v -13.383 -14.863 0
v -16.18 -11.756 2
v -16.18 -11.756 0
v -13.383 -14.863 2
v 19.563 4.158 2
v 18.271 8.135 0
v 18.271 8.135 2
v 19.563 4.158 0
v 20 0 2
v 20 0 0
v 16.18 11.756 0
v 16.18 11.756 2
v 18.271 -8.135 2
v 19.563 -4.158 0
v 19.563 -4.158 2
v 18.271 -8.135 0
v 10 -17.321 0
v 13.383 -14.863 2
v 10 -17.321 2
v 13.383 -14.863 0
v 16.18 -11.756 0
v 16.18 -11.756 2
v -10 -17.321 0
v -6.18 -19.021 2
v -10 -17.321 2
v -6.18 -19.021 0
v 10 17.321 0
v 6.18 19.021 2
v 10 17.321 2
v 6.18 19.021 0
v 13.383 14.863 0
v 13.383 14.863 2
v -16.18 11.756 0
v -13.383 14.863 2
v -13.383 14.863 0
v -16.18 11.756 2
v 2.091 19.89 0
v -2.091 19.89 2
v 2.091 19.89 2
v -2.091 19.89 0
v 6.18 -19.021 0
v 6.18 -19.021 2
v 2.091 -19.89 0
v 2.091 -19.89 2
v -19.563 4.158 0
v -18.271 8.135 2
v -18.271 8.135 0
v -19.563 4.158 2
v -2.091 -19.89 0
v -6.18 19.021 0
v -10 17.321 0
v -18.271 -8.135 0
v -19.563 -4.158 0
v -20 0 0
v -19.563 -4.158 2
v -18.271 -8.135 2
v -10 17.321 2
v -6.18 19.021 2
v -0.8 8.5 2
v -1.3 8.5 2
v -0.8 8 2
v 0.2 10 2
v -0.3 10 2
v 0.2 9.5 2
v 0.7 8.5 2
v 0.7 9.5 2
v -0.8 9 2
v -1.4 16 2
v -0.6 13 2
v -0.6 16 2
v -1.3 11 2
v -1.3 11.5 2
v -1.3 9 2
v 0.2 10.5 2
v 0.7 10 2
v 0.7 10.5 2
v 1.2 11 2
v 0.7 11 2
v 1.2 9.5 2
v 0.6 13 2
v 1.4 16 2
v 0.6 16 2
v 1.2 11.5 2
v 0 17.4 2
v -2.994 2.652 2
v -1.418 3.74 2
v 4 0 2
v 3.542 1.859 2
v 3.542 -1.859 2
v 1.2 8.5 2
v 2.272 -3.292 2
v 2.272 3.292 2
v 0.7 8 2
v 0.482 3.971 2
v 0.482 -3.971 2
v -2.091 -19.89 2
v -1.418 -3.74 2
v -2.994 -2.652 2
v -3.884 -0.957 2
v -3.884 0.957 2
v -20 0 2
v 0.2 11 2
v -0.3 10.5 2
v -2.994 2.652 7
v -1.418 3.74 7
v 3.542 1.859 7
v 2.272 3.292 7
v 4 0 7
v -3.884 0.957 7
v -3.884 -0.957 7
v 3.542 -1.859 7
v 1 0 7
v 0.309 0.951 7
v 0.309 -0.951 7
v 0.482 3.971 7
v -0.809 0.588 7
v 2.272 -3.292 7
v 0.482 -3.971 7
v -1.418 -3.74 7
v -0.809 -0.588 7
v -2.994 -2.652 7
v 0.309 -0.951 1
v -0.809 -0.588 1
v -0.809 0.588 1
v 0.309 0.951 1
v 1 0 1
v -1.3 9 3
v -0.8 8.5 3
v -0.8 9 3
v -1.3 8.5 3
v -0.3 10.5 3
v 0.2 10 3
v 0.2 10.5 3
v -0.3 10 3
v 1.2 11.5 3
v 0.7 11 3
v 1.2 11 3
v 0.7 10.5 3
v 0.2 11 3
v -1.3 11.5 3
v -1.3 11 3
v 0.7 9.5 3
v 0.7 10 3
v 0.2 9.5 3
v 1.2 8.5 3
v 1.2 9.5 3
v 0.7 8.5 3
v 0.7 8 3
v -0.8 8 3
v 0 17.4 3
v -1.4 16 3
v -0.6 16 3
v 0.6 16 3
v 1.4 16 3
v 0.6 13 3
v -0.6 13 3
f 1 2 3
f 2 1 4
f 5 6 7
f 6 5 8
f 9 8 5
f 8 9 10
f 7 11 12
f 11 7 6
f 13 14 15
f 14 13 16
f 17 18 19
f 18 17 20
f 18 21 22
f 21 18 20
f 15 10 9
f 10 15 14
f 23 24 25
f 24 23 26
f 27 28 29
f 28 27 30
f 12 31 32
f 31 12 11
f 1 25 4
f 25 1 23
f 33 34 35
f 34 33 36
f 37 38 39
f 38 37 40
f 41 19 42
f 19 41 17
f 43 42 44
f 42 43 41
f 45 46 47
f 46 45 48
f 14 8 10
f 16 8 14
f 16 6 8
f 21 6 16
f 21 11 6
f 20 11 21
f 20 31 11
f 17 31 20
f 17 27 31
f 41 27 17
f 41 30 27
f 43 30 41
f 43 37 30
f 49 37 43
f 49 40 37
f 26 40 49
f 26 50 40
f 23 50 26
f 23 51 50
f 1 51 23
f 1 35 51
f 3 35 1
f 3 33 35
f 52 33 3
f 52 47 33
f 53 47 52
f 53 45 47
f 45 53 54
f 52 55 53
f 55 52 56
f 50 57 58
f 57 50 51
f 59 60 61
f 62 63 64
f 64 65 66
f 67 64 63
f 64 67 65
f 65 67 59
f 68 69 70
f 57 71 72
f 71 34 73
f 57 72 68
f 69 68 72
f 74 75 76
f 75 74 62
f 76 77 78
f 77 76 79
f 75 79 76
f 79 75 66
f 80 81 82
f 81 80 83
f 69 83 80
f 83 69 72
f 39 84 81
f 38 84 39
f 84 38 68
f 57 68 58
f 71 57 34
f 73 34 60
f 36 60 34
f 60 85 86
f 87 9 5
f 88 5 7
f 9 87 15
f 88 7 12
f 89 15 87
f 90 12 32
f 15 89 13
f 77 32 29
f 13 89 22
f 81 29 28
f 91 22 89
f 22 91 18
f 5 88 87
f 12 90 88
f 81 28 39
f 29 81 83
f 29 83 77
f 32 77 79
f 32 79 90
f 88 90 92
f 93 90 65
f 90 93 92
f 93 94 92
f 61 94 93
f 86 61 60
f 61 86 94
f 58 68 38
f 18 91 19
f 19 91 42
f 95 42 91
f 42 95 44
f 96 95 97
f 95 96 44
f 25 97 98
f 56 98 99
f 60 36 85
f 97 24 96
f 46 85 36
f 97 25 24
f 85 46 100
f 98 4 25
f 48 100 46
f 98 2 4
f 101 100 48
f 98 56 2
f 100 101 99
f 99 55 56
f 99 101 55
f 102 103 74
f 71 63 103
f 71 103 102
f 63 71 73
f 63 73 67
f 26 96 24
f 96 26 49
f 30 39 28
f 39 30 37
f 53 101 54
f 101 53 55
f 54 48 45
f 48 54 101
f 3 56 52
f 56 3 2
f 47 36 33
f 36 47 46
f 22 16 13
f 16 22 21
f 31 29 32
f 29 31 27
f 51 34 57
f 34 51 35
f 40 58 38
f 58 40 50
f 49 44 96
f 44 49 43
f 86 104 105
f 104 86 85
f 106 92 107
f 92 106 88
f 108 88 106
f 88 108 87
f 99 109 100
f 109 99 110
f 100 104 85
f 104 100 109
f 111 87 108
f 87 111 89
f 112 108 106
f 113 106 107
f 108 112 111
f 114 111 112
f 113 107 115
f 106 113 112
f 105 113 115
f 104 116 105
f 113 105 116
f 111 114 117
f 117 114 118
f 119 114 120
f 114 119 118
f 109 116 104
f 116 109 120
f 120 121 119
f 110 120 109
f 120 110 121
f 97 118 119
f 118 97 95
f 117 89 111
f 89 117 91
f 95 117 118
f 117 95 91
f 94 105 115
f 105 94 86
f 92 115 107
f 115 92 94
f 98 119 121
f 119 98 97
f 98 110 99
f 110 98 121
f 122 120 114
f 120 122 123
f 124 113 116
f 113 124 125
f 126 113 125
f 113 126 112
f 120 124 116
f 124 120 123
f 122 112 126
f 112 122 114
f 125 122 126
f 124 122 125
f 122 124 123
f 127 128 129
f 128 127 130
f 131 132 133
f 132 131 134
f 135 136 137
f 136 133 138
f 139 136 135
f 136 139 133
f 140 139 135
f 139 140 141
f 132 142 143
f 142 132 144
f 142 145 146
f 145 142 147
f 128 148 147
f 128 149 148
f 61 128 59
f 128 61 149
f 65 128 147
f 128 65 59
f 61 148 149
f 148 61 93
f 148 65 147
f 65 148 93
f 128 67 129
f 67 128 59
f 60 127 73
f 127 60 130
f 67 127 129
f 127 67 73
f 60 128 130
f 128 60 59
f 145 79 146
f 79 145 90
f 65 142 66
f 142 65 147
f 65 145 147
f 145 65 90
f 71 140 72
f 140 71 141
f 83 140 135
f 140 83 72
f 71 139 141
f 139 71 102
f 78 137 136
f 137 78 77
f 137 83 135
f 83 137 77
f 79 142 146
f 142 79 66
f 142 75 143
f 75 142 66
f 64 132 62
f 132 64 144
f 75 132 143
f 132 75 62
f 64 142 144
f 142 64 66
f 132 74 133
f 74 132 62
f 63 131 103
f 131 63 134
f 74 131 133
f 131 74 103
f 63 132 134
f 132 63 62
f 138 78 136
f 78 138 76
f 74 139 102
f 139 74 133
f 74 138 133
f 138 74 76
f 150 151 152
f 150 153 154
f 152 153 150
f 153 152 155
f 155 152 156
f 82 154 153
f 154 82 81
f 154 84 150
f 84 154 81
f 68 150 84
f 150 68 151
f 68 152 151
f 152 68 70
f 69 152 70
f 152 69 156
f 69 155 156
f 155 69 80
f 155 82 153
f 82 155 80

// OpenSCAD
extRad = 20; // in mm
outerPostRad = 4;
innerPostRad = 1;

bottomDial();
straightArrow();
translate([-1.3,8,0]) scale([0.5,0.5,3]) drawtext("3");

// translate([0,0,12]) topDial();

// translate([0,0,20]) rotate([180,0,0]) pin();


/******** DIAL MODULES ********/

module bottomDial() {
	difference() {
		union() {
			cylinder(r=extRad,h=2);
			cylinder(r=outerPostRad, h=7);
		}
		translate([0,0,1]) cylinder(r=innerPostRad, h=7);
	}
}

module topDial() {
	difference() {
		union() {
			cylinder(r=extRad,h=3);
		}
		union() {
			cylinder(r=outerPostRad, h=7);
			cylinder(r=extRad - 2, h=1.5);
		}
	}
}

module pin() {
	cylinder(r=outerPostRad, h=1);
	cylinder(r=innerPostRad, h=5);
}

/******** ARROW MODULES ********/

straightPoints = [[-0.6,0], [-0.6,3], [-1.4,3], [0,4.4],
		  [1.4,3], [0.6,3], [0.6,0]];
straightPath = [[0,1,2,3,4,5,6,0]];

module straightArrow() {
	translate([0,13,0]) linear_extrude(height=3) {
		polygon(points=straightPoints, paths = straightPath);
	}
}

/******** TEXT MODULES ********/


module drawtext(text) {
	//Characters
	chars = " !\"#$%&'()*+,-./0123456789:;<=>?@ABCDEFGHIJKLMNOPQRSTUVWXYZ[\\]^_`abcdefghijklmnopqrstuvwxyz{|}";

	//Chracter table defining 5x7 characters
	//Adapted from: http://www.geocities.com/dinceraydin/djlcdsim/chartable.js
	char_table = [ [ 0, 0, 0, 0, 0, 0, 0],
                  [ 4, 0, 4, 4, 4, 4, 4],
                  [ 0, 0, 0, 0,10,10,10],
                  [10,10,31,10,31,10,10],
                  [ 4,30, 5,14,20,15, 4],
                  [ 3,19, 8, 4, 2,25,24],
                  [13,18,21, 8,20,18,12],
                  [ 0, 0, 0, 0, 8, 4,12],
                  [ 2, 4, 8, 8, 8, 4, 2],
                  [ 8, 4, 2, 2, 2, 4, 8],
                  [ 0, 4,21,14,21, 4, 0],
                  [ 0, 4, 4,31, 4, 4, 0],
                  [ 8, 4,12, 0, 0, 0, 0],
                  [ 0, 0, 0,31, 0, 0, 0],
                  [12,12, 0, 0, 0, 0, 0],
                  [ 0,16, 8, 4, 2, 1, 0],
                  [14,17,25,21,19,17,14],
                  [14, 4, 4, 4, 4,12, 4],
                  [31, 8, 4, 2, 1,17,14],
                  [14,17, 1, 2, 4, 2,31],
                  [ 2, 2,31,18,10, 6, 2],
                  [14,17, 1, 1,30,16,31],
                  [14,17,17,30,16, 8, 6],
                  [ 8, 8, 8, 4, 2, 1,31],
                  [14,17,17,14,17,17,14],
                  [12, 2, 1,15,17,17,14],
                  [ 0,12,12, 0,12,12, 0],
                  [ 8, 4,12, 0,12,12, 0],
                  [ 2, 4, 8,16, 8, 4, 2],
                  [ 0, 0,31, 0,31, 0, 0],
                  [16, 8, 4, 2, 4, 8,16],
                  [ 4, 0, 4, 2, 1,17,14],
                  [14,21,21,13, 1,17,14],
                  [17,17,31,17,17,17,14],
                  [30,17,17,30,17,17,30],
                  [14,17,16,16,16,17,14],
                  [30,17,17,17,17,17,30],
                  [31,16,16,30,16,16,31],
                  [16,16,16,30,16,16,31],
                  [15,17,17,23,16,17,14],
                  [17,17,17,31,17,17,17],
                  [14, 4, 4, 4, 4, 4,14],
                  [12,18, 2, 2, 2, 2, 7],
                  [17,18,20,24,20,18,17],
                  [31,16,16,16,16,16,16],
                  [17,17,17,21,21,27,17],
                  [17,17,19,21,25,17,17],
                  [14,17,17,17,17,17,14],
                  [16,16,16,30,17,17,30],
                  [13,18,21,17,17,17,14],
                  [17,18,20,30,17,17,30],
                  [30, 1, 1,14,16,16,15],
                  [ 4, 4, 4, 4, 4, 4,31],
                  [14,17,17,17,17,17,17],
                  [ 4,10,17,17,17,17,17],
                  [10,21,21,21,17,17,17],
                  [17,17,10, 4,10,17,17],
                  [ 4, 4, 4,10,17,17,17],
                  [31,16, 8, 4, 2, 1,31],
                  [14, 8, 8, 8, 8, 8,14],
                  [ 0, 1, 2, 4, 8,16, 0],
                  [14, 2, 2, 2, 2, 2,14],
                  [ 0, 0, 0, 0,17,10, 4],
                  [31, 0, 0, 0, 0, 0, 0],
                  [ 0, 0, 0, 0, 2, 4, 8],
                  [15,17,15, 1,14, 0, 0],
                  [30,17,17,25,22,16,16],
                  [14,17,16,16,14, 0, 0],
                  [15,17,17,19,13, 1, 1],
                  [14,16,31,17,14, 0, 0],
                  [ 8, 8, 8,28, 8, 9, 6],
                  [14, 1,15,17,15, 0, 0],
                  [17,17,17,25,22,16,16],
                  [14, 4, 4, 4,12, 0, 4],
                  [12,18, 2, 2, 2, 6, 2],
                  [18,20,24,20,18,16,16],
                  [14, 4, 4, 4, 4, 4,12],
                  [17,17,21,21,26, 0, 0],
                  [17,17,17,25,22, 0, 0],
                  [14,17,17,17,14, 0, 0],
                  [16,16,30,17,30, 0, 0],
                  [ 1, 1,15,19,13, 0, 0],
                  [16,16,16,25,22, 0, 0],
                  [30, 1,14,16,15, 0, 0],
                  [ 6, 9, 8, 8,28, 8, 8],
                  [13,19,17,17,17, 0, 0],
                  [ 4,10,17,17,17, 0, 0],
                  [10,21,21,17,17, 0, 0],
                  [17,10, 4,10,17, 0, 0],
                  [14, 1,15,17,17, 0, 0],
                  [31, 8, 4, 2,31, 0, 0],
                  [ 2, 4, 4, 8, 4, 4, 2],
                  [ 4, 4, 4, 4, 4, 4, 4],
                  [ 8, 4, 4, 2, 4, 4, 8] ];

	//Binary decode table
	dec_table = [ "00000", "00001", "00010", "00011", "00100", "00101",
  	            "00110", "00111", "01000", "01001", "01010", "01011",
  	            "01100", "01101", "01110", "01111", "10000", "10001",
  	            "10010", "10011", "10100", "10101", "10110", "10111",
	            "11000", "11001", "11010", "11011", "11100", "11101",
	            "11110", "11111" ];

	//Process string one character at a time
	for(itext = [0:len(text)-1]) {
		//Convert character to index
		assign(ichar = search(text[itext],chars,1)[0]) {
			//Decode character - rows
			for(irow = [0:6]) {
				assign(val = dec_table[char_table[ichar][irow]]) {
					//Decode character - cols
					for(icol = [0:4]) {
						assign(bit = search(val[icol],"01",1)[0]) {
							if(bit) {
								//Output cube
								translate([icol + (6*itext), irow, 0])
									cube([1.0001,1.0001,1]);
							}
						}
					}
				}
			}
		}
	}
}
